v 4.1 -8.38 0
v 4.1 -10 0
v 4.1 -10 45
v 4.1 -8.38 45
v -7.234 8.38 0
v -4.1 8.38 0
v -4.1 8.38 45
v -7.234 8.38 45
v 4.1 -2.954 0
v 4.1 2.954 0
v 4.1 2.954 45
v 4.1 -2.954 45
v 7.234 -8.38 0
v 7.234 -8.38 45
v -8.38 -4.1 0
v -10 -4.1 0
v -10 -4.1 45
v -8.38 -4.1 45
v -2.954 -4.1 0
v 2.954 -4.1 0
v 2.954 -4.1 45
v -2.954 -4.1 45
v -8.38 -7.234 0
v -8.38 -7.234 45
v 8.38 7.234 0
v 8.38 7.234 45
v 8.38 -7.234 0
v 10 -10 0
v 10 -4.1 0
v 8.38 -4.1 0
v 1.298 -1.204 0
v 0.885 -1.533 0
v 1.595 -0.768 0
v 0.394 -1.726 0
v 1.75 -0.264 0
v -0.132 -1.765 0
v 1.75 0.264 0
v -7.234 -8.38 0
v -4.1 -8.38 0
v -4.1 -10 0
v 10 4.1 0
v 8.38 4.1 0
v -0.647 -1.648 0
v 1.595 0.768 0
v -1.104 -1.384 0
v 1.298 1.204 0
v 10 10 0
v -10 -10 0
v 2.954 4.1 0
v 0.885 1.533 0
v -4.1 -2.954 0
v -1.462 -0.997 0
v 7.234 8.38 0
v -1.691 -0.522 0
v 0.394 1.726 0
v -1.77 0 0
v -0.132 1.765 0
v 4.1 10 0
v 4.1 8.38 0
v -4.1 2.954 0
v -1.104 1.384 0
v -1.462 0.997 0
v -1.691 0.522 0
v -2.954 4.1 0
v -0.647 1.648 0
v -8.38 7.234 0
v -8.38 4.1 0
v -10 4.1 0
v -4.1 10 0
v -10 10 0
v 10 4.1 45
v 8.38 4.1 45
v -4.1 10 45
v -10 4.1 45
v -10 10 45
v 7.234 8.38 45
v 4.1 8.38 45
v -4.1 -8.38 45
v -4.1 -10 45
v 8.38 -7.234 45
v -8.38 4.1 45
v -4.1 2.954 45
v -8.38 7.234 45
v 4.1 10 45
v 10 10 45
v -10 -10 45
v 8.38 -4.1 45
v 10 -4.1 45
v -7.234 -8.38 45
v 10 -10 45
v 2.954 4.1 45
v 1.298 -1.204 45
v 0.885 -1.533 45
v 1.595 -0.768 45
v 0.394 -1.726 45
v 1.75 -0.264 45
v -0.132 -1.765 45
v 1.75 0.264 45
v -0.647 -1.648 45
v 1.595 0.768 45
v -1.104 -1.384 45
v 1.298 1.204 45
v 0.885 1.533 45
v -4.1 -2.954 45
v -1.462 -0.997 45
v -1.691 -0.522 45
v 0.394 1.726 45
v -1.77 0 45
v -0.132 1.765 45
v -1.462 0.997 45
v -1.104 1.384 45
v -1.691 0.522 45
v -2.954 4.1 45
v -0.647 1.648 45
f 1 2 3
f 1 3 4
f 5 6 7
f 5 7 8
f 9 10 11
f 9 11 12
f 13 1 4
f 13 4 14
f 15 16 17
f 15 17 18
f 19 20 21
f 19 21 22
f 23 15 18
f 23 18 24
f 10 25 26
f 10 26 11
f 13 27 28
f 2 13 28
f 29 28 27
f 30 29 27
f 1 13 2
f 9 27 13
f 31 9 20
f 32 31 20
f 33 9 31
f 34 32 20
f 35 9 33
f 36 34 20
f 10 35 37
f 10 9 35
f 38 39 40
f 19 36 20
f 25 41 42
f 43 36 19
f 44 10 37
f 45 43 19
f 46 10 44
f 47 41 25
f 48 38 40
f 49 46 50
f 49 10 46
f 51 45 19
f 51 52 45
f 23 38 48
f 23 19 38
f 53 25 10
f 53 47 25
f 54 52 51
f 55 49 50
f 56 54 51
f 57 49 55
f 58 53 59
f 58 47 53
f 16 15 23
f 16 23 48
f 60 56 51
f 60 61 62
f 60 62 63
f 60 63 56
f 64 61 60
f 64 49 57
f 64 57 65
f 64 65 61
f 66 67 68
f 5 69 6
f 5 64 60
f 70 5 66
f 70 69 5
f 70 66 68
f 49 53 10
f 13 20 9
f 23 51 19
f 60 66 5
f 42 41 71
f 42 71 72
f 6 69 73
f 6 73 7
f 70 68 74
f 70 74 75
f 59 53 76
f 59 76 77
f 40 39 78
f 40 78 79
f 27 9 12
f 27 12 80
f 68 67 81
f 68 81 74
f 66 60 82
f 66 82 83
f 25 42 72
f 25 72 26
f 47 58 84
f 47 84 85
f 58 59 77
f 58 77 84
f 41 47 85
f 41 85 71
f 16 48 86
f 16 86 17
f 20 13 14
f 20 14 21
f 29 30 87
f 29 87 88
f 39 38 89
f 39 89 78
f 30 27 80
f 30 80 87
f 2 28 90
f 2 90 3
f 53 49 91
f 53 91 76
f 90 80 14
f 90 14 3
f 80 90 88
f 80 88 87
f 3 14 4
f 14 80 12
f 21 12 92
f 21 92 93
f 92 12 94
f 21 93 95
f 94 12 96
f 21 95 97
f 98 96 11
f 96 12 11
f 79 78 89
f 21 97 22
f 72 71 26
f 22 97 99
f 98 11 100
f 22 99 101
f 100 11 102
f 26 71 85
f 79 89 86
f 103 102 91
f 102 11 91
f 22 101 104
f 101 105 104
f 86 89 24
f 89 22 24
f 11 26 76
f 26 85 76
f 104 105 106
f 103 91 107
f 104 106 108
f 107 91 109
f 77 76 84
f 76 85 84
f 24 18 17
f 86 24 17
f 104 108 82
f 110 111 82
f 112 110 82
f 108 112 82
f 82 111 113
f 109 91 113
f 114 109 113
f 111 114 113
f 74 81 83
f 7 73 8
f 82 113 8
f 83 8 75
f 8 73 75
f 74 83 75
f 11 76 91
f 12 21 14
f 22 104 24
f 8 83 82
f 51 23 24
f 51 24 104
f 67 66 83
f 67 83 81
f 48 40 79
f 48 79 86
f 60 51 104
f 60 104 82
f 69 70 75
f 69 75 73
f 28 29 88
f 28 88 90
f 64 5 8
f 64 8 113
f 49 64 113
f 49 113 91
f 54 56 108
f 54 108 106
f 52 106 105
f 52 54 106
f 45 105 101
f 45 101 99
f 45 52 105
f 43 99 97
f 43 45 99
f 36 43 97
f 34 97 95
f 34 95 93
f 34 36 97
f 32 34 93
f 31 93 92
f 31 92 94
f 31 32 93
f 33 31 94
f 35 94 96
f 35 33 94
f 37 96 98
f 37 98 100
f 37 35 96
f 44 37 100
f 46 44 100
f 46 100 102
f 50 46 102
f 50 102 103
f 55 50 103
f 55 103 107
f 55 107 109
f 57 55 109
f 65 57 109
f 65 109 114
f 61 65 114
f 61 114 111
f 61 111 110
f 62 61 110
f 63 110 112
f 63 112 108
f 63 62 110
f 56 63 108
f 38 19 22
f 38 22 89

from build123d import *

# Parameters (mm, degrees)
SKETCH1_R           = 1.77
BOSS_EXTRUDE1_DEPTH = 45


with BuildPart() as part:
    # Sketch1 → Boss-Extrude1 (new body)
    with BuildSketch(Plane.XY):
        Polygon((-8.38, 4.1), (-10, 4.1), (-10, 10), (-4.1, 10), (-4.1, 8.38), (-7.234487014, 8.38), (-2.954487014, 4.1), (2.954487014, 4.1), (7.234487014, 8.38), (4.1, 8.38), (4.1, 10), (10, 10), (10, 4.1), (8.38, 4.1), (8.38, 7.234487014), (4.1, 2.954487014), (4.1, -2.954487014), (8.38, -7.234487014), (8.38, -4.1), (10, -4.1), (10, -10), (4.1, -10), (4.1, -8.38), (7.234487014, -8.38), (2.954487014, -4.1), (-2.954487014, -4.1), (-7.234487014, -8.38), (-4.1, -8.38), (-4.1, -10), (-10, -10), (-10, -4.1), (-8.38, -4.1), (-8.38, -7.234487014), (-4.1, -2.954487014), (-4.1, 2.954487014), (-8.38, 7.234487014), align=None)
        with Locations(Location((0, 0, 0), (0, 0, 180))):
            Circle(SKETCH1_R, mode=Mode.SUBTRACT)
    extrude(amount=BOSS_EXTRUDE1_DEPTH)


solid = part.part
